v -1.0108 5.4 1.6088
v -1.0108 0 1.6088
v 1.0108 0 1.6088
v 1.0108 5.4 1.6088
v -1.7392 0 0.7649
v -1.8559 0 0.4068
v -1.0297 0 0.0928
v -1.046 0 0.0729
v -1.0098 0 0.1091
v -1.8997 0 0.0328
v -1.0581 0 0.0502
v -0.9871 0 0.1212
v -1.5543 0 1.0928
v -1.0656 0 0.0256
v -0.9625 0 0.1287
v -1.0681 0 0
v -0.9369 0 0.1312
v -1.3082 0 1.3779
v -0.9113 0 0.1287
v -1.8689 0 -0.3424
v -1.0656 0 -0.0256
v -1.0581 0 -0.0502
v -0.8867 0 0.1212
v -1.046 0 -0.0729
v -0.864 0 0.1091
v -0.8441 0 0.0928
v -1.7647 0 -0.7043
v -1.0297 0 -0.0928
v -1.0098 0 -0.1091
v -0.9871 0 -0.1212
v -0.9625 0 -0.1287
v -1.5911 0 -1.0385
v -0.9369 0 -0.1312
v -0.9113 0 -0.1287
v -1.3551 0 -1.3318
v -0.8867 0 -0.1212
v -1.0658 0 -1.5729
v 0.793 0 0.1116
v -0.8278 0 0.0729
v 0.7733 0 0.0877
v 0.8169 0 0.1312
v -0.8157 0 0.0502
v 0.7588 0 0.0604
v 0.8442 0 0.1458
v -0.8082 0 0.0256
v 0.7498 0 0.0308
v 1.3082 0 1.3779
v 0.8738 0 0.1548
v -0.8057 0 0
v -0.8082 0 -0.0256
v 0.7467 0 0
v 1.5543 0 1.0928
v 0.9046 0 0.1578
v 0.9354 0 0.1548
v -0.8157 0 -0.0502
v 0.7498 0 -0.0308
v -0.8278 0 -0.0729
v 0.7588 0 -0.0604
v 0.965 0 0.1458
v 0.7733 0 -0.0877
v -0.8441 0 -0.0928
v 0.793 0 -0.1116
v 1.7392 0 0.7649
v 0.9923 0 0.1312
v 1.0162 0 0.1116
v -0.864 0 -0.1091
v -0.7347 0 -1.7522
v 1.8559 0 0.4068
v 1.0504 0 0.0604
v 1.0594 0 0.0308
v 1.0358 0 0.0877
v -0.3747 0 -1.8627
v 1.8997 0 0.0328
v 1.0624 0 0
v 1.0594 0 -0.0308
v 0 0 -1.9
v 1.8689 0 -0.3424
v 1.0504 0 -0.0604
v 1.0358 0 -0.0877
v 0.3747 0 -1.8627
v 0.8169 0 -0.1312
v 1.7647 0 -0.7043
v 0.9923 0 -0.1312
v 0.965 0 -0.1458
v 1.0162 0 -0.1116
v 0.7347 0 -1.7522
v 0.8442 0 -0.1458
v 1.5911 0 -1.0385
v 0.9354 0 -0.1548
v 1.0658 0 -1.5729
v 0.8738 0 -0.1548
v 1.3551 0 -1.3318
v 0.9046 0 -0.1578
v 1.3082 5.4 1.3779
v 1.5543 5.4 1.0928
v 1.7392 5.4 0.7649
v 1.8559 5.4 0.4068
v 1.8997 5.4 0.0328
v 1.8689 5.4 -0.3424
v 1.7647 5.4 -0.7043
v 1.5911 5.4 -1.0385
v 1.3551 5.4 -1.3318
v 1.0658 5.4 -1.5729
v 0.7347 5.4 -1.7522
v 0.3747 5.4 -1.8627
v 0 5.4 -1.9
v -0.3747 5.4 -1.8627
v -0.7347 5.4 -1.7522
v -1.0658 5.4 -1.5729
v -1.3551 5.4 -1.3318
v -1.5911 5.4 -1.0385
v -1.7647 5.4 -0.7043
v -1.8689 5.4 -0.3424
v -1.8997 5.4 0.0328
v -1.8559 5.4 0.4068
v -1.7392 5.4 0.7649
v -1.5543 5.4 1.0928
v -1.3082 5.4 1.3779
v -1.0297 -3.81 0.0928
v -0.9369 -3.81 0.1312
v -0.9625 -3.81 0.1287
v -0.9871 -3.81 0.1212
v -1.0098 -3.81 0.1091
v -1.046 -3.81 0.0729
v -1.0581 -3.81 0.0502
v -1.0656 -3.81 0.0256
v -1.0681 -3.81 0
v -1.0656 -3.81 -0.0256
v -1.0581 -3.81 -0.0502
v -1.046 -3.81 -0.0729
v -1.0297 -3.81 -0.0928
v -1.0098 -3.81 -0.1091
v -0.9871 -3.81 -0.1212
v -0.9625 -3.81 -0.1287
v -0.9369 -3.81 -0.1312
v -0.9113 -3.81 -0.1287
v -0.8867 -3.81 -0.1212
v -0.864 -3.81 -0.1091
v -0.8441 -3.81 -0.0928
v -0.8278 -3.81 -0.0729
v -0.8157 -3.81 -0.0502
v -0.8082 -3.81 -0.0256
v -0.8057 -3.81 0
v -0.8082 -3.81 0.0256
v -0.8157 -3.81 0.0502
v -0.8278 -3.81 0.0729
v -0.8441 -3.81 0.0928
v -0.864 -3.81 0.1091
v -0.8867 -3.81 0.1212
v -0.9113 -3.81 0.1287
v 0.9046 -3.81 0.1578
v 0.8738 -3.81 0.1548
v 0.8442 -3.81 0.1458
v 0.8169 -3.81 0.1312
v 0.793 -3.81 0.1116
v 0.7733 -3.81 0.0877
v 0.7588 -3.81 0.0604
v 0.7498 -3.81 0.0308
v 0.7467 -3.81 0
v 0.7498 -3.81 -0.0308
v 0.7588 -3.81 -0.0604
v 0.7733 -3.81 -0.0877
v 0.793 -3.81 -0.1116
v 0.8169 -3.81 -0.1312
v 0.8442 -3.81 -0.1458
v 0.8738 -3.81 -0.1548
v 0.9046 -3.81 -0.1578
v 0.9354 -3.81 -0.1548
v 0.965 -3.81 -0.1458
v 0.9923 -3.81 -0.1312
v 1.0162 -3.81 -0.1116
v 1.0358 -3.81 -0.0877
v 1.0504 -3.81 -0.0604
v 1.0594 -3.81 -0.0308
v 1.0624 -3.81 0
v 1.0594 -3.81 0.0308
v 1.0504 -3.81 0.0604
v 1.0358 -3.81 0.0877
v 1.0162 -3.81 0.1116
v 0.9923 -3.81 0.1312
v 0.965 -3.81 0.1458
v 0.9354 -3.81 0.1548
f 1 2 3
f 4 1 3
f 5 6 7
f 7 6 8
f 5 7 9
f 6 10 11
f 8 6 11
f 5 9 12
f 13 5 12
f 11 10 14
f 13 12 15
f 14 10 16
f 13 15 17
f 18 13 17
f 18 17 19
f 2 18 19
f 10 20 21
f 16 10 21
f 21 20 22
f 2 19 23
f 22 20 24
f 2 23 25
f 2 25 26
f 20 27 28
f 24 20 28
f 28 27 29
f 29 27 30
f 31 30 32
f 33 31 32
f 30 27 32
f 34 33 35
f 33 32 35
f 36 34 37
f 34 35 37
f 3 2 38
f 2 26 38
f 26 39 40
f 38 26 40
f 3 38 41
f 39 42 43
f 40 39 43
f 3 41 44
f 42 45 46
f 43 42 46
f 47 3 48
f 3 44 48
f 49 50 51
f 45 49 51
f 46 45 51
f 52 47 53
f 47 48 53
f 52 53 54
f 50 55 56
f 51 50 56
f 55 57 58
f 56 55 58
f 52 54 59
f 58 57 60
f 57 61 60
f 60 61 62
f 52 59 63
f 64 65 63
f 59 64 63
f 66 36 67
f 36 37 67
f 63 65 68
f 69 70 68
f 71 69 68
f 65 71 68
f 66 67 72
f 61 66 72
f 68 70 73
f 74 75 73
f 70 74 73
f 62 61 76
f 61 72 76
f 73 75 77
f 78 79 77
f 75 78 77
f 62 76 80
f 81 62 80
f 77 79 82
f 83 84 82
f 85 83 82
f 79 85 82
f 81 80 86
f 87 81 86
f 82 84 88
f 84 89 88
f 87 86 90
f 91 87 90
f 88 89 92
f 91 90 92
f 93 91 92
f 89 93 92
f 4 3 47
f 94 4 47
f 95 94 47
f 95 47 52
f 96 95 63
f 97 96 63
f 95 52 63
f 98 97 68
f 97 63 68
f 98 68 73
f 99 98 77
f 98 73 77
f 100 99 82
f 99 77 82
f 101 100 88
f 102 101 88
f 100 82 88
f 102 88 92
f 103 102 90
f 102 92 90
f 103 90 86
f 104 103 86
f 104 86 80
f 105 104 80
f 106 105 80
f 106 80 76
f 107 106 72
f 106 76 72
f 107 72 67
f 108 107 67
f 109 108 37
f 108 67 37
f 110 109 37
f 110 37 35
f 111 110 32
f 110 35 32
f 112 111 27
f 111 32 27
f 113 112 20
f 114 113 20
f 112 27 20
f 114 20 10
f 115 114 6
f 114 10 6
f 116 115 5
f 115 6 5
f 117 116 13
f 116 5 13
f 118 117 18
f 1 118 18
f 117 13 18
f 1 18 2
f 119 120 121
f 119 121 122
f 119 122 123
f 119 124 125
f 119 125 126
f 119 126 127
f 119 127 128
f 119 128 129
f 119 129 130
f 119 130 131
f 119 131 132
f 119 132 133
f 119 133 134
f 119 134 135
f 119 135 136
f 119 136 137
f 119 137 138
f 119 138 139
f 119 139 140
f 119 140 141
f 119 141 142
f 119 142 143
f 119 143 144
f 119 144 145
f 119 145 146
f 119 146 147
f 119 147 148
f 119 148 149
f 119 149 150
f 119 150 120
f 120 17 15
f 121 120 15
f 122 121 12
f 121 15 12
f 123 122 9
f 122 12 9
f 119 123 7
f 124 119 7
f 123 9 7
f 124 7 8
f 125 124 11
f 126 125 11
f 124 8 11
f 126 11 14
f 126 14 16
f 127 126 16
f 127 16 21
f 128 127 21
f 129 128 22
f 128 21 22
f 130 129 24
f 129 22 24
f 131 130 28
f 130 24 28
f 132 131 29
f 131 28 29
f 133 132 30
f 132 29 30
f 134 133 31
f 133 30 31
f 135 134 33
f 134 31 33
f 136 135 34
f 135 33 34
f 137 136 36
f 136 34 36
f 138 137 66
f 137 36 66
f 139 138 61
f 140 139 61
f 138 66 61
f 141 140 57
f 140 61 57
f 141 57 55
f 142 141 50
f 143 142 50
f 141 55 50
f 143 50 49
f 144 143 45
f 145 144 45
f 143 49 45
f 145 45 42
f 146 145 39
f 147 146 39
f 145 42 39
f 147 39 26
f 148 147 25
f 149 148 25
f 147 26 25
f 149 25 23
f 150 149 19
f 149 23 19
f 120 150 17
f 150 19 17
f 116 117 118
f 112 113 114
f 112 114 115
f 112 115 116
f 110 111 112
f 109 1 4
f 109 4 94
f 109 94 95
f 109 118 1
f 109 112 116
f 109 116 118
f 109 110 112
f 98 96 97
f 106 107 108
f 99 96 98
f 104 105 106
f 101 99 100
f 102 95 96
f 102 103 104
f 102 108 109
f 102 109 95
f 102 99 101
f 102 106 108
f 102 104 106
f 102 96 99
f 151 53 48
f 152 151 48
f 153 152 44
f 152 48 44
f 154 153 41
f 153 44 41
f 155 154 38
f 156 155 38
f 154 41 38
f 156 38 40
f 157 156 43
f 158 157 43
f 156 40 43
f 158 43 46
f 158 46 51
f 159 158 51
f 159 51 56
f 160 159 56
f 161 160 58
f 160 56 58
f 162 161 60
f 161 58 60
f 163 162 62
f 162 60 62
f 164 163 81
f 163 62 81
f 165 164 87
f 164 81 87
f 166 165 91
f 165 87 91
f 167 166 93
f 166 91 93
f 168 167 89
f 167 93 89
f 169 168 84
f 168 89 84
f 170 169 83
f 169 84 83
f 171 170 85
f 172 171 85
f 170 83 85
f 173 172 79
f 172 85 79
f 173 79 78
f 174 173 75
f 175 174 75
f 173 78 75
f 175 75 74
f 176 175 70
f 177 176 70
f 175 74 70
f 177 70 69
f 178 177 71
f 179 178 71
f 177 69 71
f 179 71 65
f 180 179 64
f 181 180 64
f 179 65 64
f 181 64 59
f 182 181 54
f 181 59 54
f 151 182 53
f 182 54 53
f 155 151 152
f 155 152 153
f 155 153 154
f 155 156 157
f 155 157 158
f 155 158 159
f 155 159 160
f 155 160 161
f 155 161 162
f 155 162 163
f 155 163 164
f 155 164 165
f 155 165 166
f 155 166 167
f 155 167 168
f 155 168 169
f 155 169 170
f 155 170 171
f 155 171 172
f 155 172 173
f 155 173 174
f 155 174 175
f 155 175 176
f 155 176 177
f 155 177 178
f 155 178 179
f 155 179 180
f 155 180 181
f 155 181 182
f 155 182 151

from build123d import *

# Parameters (mm, degrees)
SKETCH1_R           = 1.55
BOSS_EXTRUDE1_DEPTH = 5.4
SKETCH2_R           = 0.15783532
SKETCH2_R_2         = 0.131217629
BOSS_EXTRUDE2_DEPTH = 3.81


with BuildPart() as part:
    # Sketch1 → Boss-Extrude1 (new body)
    # profile 1 of 2: a face of its own
    with BuildSketch(Plane(origin=(0, 0, 0), x_dir=(1, 0, 0), z_dir=(0, 1, 0))):
        with BuildLine():
            Line((-1.010787693, -1.608822004), (1.010787693, -1.608822004))
            ThreePointArc((1.010787693, -1.608822004), (0, 1.9), (-1.010787693, -1.608822004))
        make_face()
        Circle(SKETCH1_R, mode=Mode.SUBTRACT)
    # profile 2 of 2: a face of its own
    with BuildSketch(Plane(origin=(0, 0, 0), x_dir=(1, 0, 0), z_dir=(0, 1, 0))):
        Circle(SKETCH1_R)
    extrude(amount=BOSS_EXTRUDE1_DEPTH)

    # Sketch2 → Boss-Extrude2 (add)
    with BuildSketch(Plane.XZ):
        with Locations(Location((0.904579412, 0, 0), (0, 0, 90))):
            Circle(SKETCH2_R)
        with Locations(Location((-0.93688582, 0, 0), (0, 0, 90))):
            Circle(SKETCH2_R_2)
    extrude(amount=BOSS_EXTRUDE2_DEPTH)


solid = part.part
